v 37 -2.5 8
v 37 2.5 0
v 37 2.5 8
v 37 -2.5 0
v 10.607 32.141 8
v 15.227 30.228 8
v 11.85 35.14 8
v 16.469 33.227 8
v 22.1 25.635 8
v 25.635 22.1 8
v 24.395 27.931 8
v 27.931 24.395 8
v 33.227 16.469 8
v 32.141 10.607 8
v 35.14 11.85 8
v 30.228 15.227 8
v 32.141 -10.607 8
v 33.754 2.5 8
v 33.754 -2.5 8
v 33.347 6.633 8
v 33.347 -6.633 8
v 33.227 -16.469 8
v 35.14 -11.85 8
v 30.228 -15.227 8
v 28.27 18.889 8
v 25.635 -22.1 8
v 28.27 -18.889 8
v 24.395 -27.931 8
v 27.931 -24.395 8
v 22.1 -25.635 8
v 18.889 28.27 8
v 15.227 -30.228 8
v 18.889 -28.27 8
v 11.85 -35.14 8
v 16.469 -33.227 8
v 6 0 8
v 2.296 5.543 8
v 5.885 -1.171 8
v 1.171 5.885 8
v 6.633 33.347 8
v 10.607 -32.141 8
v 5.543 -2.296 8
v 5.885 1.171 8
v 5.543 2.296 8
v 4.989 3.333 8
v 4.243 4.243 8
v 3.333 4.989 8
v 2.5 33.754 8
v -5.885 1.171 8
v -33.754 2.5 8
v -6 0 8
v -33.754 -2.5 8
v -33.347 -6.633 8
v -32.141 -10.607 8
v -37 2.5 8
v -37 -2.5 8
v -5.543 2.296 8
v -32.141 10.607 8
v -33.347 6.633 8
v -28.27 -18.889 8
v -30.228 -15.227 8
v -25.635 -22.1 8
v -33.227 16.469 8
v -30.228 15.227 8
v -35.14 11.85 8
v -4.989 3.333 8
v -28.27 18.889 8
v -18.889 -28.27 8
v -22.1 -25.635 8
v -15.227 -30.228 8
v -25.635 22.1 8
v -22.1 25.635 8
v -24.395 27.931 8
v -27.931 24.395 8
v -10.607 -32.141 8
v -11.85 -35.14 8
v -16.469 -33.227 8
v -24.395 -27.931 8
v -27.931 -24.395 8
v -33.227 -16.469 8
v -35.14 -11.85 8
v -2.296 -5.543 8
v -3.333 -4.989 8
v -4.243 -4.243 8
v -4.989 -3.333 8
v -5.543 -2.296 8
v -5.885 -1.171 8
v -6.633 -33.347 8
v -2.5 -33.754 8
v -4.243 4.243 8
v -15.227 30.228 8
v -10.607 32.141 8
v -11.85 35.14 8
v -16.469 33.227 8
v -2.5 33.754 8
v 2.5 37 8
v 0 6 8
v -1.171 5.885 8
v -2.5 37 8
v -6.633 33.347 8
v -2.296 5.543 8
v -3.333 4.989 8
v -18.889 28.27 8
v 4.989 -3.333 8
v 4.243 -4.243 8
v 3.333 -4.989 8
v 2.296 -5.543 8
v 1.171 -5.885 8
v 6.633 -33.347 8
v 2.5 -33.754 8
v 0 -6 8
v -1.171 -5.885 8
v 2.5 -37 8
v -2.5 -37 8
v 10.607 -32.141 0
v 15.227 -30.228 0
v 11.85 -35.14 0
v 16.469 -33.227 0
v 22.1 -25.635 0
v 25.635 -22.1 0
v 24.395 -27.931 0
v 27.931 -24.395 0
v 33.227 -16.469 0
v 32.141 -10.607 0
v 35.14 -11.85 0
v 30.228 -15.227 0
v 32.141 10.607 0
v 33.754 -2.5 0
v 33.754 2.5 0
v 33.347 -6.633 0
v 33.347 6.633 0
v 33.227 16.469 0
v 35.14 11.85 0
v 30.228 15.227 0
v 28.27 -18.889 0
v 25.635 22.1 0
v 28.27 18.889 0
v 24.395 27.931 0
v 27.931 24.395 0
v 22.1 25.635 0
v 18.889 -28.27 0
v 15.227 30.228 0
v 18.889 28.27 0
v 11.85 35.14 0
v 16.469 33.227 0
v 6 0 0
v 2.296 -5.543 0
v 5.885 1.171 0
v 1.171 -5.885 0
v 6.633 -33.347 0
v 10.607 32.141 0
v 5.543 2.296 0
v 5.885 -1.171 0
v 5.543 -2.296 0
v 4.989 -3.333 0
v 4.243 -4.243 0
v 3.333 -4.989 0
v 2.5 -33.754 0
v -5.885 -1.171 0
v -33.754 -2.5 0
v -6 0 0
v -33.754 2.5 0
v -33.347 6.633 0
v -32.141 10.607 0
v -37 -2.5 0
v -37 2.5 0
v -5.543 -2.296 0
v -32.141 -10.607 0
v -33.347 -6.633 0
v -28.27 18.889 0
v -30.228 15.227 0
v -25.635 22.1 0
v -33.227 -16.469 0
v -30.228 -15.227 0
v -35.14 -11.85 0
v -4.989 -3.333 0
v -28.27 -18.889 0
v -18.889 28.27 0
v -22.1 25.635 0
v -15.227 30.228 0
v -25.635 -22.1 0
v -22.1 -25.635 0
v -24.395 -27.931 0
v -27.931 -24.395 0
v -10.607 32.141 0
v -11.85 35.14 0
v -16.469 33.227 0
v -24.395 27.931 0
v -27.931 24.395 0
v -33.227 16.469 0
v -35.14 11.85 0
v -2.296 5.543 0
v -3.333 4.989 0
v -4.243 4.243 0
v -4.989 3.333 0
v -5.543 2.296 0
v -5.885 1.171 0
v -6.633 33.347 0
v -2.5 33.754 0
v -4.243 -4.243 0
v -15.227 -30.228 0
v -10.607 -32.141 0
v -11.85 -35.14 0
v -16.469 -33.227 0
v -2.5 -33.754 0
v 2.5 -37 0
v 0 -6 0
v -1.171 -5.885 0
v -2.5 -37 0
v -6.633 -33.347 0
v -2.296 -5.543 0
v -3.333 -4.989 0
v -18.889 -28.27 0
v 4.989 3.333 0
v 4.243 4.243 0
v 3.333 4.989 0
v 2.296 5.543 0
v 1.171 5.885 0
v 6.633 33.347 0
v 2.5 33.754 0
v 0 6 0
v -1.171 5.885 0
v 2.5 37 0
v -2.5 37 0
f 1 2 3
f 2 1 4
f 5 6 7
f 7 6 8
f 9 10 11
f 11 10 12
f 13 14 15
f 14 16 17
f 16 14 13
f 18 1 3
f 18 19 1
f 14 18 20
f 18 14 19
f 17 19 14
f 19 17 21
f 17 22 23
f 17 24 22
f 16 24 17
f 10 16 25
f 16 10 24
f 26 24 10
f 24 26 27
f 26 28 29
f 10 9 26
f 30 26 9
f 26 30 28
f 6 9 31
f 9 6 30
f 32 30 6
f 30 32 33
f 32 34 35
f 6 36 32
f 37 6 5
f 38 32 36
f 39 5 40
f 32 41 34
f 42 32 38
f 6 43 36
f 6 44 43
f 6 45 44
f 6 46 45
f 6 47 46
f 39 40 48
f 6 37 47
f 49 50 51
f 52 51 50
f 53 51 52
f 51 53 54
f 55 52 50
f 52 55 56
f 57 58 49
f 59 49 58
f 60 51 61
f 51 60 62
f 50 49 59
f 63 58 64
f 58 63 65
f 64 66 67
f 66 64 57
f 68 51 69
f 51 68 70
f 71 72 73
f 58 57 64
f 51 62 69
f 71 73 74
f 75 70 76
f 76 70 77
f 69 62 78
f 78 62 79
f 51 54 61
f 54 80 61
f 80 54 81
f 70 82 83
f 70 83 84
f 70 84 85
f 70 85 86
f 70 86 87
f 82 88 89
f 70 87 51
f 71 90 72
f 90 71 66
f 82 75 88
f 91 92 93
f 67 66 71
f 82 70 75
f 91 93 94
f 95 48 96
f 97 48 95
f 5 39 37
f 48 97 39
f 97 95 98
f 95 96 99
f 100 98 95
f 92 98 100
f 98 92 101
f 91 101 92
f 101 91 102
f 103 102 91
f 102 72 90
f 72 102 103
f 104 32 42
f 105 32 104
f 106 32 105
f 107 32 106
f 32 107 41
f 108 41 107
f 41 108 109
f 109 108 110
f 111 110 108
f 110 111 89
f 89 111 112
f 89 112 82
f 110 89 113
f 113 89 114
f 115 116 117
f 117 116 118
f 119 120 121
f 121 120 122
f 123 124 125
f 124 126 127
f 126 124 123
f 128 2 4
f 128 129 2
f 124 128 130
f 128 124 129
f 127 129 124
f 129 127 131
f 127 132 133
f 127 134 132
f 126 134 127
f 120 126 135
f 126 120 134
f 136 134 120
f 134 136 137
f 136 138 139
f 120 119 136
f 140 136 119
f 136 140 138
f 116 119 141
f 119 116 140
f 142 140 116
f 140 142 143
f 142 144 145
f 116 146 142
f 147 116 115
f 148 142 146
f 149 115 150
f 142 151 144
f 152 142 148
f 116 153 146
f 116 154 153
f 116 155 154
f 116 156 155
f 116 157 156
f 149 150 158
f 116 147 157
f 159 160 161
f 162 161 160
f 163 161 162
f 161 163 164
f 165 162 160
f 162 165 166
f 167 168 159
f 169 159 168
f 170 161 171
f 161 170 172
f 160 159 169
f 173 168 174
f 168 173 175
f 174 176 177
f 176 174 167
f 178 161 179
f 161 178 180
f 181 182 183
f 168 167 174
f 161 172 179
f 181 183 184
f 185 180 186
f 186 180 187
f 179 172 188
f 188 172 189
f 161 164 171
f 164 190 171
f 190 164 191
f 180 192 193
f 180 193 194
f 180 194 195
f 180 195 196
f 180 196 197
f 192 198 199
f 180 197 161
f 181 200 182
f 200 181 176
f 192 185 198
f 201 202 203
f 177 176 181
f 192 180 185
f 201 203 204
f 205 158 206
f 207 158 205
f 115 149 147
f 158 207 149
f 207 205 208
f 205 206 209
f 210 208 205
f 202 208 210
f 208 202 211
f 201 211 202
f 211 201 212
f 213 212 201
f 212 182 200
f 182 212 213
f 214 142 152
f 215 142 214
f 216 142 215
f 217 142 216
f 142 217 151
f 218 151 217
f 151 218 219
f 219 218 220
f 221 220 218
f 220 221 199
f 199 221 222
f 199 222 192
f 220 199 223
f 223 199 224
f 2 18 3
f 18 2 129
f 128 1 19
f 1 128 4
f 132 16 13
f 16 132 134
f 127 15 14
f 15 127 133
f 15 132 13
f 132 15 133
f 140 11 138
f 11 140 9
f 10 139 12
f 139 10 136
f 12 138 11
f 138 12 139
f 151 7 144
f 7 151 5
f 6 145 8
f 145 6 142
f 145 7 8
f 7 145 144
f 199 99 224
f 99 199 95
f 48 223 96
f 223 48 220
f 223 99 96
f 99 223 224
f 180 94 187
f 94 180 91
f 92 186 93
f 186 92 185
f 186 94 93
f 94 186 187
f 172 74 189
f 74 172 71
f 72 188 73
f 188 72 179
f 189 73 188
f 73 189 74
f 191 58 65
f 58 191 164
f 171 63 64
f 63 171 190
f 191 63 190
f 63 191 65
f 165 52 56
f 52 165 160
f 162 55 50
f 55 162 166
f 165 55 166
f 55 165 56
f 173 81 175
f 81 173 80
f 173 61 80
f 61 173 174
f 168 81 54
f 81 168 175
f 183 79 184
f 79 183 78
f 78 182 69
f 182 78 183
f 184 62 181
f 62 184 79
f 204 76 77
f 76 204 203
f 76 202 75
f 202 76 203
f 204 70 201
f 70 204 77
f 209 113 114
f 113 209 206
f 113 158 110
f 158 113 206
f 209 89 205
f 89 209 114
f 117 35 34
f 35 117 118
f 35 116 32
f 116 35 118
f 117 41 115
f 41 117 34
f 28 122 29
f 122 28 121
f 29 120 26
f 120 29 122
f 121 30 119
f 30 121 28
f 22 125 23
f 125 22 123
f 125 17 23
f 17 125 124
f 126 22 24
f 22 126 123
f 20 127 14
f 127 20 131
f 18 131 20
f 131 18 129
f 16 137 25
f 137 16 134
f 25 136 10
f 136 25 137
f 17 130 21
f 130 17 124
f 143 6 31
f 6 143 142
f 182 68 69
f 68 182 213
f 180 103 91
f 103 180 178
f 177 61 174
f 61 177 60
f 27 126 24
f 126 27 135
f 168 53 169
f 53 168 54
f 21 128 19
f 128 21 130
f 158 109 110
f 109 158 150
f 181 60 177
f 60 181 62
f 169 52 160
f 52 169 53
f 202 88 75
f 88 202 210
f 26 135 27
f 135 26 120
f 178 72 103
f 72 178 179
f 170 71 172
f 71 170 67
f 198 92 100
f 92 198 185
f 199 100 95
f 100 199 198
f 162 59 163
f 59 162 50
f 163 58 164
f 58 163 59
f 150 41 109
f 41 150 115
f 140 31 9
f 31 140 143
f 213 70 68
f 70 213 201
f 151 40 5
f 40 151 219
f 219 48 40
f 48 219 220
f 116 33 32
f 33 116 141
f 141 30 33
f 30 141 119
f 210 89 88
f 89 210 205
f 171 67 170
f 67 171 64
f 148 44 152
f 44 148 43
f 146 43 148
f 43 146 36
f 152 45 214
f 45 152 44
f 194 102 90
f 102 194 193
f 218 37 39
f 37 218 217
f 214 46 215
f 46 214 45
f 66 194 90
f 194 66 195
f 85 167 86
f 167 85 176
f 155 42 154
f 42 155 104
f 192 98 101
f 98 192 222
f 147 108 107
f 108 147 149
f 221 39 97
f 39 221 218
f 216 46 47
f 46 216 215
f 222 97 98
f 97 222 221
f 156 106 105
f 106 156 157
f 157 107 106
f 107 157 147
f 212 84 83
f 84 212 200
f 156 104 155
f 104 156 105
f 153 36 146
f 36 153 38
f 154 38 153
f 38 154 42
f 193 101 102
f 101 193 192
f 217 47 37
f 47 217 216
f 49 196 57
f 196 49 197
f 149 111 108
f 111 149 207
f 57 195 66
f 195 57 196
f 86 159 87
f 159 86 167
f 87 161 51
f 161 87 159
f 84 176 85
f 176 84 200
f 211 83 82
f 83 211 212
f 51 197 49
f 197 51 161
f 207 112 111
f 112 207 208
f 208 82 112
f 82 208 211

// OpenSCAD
$fn = 32;

// ----------------------------------------------------------------------
// Spur blank: bored gear blank
// ----------------------------------------------------------------------

// --- parameters (mm) ---
disc_r = 34;              // blank root radius
disc_t = 8;               // blank thickness
n_teeth = 16;             // stub tooth count
tooth_w = 5;              // tooth width at the root
tooth_h = 3;              // tooth height above the root
bore_r = 6;               // central bore radius

out_r = disc_r + tooth_h;  // tip radius
bbox_x = 74.0;  // measured width over the teeth
bbox_y = 74.0;  // measured depth over the teeth

difference() {
union() {
  cylinder(r = disc_r, h = disc_t);
  for (i = [0 : n_teeth - 1])
    rotate([0, 0, i * 360 / n_teeth])
      translate([disc_r - 1, -tooth_w / 2, 0])
        cube([tooth_h + 1, tooth_w, disc_t]);
}
  translate([0, 0, -1]) cylinder(r = bore_r, h = disc_t + 2);
}
